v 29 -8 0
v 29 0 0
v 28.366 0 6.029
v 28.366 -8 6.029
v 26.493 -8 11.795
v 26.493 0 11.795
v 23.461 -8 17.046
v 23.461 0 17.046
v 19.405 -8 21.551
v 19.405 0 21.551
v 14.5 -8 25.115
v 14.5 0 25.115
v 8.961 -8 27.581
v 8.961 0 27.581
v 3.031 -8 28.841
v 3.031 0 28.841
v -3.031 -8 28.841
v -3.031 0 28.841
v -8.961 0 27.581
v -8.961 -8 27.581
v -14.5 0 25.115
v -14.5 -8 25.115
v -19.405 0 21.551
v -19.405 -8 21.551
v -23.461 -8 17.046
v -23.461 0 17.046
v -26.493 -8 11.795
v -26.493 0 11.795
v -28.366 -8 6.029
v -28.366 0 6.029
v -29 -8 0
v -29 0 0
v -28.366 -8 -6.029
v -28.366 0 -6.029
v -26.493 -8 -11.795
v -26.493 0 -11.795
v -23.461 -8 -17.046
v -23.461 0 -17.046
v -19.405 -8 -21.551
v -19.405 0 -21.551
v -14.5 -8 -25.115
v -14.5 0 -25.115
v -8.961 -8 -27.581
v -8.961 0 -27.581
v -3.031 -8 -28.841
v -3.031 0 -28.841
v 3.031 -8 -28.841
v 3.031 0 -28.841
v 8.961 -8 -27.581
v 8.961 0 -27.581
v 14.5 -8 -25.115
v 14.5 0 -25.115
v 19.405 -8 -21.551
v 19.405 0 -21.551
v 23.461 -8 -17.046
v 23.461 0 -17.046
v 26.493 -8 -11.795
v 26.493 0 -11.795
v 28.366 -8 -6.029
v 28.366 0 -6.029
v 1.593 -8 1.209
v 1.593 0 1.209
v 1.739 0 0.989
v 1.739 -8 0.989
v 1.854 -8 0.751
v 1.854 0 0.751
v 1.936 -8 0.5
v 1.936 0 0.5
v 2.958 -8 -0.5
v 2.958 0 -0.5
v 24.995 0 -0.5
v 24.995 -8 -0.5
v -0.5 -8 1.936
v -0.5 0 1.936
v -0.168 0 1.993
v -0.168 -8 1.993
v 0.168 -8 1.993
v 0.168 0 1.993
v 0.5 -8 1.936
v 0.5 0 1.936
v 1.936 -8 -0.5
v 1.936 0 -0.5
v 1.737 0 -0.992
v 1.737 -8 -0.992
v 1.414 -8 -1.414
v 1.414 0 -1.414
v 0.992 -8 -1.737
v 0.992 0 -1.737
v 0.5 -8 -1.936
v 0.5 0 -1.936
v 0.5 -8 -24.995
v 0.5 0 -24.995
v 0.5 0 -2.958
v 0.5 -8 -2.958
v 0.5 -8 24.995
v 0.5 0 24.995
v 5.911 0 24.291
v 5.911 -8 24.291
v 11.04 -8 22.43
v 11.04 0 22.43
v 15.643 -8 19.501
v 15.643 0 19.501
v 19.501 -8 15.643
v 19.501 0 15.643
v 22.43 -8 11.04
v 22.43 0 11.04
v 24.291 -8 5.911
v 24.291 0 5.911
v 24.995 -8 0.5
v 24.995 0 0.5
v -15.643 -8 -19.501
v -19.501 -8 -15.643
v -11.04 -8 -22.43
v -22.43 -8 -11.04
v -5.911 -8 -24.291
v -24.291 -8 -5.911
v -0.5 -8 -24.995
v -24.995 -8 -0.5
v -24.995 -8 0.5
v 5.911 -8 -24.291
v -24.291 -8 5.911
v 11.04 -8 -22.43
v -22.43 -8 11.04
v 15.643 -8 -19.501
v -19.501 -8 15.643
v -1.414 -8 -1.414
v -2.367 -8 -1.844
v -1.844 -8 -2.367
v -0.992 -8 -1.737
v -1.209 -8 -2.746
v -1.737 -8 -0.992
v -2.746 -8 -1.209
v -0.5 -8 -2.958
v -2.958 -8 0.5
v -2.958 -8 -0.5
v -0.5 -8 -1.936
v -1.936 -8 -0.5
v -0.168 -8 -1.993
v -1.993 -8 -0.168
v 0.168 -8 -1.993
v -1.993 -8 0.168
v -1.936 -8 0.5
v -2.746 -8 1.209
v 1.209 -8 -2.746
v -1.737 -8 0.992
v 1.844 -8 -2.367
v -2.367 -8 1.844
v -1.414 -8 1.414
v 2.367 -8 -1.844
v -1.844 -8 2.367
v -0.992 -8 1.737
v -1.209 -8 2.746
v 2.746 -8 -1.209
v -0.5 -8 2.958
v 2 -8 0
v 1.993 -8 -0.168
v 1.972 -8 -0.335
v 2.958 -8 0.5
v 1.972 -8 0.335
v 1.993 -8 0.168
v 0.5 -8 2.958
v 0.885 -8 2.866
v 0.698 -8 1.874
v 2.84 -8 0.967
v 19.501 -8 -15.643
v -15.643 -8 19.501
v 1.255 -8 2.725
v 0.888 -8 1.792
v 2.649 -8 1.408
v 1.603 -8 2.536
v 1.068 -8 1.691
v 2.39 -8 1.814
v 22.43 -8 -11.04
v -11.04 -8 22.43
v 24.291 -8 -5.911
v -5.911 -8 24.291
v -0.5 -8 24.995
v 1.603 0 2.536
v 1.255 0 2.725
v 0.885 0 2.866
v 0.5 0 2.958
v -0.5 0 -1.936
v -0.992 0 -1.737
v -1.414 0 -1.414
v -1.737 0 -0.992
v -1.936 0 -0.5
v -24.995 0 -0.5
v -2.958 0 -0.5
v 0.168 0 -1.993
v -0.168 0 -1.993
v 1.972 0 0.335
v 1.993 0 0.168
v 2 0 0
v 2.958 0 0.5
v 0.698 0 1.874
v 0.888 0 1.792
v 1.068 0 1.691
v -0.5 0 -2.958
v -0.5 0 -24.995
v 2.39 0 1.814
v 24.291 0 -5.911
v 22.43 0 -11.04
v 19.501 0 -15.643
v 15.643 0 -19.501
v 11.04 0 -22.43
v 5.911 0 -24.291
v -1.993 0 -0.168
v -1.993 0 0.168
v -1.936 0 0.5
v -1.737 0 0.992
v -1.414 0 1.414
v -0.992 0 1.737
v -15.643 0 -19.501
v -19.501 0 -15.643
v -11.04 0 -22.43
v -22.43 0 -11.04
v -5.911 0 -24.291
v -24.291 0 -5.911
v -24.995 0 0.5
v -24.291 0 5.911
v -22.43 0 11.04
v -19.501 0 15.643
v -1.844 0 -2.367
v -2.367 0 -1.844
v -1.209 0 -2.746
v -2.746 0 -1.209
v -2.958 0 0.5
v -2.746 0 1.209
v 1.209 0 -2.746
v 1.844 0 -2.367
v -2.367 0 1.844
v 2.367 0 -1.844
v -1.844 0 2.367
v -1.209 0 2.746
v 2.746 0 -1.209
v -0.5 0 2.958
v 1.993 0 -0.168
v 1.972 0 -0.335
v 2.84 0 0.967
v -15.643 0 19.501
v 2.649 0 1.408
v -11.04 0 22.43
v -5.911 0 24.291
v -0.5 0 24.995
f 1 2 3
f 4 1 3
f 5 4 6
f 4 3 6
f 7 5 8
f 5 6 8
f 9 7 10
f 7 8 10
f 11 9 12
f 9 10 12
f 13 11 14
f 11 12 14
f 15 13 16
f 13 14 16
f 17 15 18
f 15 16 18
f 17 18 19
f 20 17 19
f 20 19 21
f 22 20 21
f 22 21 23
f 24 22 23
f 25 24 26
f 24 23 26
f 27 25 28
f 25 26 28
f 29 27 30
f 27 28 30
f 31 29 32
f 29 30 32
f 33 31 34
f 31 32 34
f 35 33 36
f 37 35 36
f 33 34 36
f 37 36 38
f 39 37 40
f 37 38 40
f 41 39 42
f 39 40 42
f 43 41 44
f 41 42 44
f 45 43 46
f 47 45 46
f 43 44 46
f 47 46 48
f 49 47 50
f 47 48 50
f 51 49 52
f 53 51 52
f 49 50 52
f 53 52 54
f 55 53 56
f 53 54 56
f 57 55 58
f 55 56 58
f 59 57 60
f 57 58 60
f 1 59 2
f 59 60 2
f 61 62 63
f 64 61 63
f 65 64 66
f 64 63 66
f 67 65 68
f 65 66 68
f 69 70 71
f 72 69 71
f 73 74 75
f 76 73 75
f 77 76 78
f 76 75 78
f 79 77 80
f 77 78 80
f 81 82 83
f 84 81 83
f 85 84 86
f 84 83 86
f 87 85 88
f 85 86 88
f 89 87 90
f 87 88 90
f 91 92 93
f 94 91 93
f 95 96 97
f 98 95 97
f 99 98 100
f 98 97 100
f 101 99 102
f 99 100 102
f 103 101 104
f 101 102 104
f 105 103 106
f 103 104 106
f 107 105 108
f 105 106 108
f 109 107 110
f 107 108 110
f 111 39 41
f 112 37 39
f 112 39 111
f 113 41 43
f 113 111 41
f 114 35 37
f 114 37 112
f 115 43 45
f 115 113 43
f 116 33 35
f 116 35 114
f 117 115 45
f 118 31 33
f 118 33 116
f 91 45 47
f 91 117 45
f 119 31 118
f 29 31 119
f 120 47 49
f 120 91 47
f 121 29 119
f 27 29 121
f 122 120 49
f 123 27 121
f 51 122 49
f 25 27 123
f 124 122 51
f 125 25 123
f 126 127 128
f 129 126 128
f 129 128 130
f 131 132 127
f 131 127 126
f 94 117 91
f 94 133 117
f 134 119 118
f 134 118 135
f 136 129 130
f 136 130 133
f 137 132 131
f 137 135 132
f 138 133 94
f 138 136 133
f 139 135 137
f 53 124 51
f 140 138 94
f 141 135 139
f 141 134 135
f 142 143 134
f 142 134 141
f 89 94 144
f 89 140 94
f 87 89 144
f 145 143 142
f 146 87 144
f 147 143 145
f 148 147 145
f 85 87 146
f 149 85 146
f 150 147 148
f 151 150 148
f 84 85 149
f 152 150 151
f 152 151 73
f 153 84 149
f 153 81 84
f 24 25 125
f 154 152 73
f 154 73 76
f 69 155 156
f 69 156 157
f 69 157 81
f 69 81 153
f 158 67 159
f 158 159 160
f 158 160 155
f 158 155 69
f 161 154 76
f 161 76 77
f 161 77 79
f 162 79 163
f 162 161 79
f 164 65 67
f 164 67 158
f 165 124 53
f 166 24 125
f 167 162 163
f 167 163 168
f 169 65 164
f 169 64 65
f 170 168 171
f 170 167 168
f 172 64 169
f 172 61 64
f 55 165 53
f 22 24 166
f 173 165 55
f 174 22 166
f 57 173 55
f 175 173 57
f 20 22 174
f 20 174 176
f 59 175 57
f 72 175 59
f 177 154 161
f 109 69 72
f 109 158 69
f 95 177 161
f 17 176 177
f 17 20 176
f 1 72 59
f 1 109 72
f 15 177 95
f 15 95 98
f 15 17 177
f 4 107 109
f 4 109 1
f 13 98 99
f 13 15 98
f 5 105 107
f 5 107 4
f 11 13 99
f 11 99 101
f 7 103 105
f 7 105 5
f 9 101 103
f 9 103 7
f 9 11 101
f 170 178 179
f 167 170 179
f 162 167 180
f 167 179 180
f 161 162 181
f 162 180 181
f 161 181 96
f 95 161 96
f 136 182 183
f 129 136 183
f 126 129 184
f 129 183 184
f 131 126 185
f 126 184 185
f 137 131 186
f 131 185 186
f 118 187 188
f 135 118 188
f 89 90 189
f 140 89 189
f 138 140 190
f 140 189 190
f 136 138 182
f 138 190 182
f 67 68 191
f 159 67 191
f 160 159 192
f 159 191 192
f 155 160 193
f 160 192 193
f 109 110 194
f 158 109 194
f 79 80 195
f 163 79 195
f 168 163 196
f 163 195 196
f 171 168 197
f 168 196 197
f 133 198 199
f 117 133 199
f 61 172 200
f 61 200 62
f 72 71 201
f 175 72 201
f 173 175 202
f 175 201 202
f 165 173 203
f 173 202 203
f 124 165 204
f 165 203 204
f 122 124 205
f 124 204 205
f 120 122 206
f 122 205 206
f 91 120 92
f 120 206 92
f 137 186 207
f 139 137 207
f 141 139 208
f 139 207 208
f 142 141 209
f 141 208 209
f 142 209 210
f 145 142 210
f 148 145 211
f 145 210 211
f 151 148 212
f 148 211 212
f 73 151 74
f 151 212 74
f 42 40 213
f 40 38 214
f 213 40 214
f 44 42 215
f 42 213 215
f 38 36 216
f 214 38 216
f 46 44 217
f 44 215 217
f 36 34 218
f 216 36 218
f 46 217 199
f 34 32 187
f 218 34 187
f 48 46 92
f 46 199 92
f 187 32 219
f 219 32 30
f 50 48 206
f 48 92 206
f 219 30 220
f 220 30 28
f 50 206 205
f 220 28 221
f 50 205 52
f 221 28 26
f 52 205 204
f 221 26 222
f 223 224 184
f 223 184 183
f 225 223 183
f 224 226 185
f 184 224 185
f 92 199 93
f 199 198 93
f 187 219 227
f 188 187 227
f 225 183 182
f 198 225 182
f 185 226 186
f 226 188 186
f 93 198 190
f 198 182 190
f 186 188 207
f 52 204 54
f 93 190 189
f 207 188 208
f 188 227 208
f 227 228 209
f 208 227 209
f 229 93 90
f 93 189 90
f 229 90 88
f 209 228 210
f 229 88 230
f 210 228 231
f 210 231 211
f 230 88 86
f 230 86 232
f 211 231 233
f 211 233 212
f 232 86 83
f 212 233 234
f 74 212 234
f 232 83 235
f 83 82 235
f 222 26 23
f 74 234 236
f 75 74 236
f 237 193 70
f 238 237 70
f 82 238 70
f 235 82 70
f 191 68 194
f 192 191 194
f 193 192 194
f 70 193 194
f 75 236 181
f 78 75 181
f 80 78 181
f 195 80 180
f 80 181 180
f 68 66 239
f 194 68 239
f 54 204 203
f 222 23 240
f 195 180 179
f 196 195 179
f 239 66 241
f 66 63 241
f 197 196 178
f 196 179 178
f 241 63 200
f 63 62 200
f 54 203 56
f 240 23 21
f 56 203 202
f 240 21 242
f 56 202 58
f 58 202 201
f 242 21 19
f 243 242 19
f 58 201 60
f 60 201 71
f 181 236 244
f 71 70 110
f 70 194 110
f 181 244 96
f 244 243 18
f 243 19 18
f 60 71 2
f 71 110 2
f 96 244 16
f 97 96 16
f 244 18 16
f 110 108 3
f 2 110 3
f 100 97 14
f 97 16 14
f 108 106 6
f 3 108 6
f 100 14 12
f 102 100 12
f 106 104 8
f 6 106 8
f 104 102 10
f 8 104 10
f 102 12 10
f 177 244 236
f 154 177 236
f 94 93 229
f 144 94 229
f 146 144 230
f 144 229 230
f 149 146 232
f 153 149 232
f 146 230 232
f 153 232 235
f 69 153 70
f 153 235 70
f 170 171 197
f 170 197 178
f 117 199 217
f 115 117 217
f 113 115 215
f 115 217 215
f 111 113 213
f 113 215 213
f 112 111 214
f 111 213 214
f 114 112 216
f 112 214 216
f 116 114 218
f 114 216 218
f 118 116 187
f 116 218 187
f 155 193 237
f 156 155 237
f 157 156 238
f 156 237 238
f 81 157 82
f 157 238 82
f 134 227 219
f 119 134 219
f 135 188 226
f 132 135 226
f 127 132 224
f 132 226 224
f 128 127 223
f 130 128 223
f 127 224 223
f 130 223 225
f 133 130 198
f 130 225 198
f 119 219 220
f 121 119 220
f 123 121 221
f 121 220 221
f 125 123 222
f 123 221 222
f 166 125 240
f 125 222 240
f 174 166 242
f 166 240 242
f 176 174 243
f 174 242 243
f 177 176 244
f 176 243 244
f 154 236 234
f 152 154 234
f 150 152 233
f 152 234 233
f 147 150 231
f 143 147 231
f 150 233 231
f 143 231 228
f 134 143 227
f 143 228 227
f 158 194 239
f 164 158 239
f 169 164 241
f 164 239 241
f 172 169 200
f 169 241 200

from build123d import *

# Parameters (mm, degrees)
F0_R     = 29
F1_DEPTH = 8


with BuildPart() as f1:
    # F0 (on Front) → F1 (new body)
    with BuildSketch(Plane.XZ):
        Circle(F0_R)
        with BuildLine():
            ThreePointArc((0.5, 24.9949994999), (17.6776695297, 17.6776695297), (24.9949994999, 0.5))
            ThreePointArc((24.9949994999, 0.5), (24.9987498437, 0.2500125022), (25, 0))
            ThreePointArc((25, 0), (24.9987498437, -0.2500125022), (24.9949994999, -0.5))
            ThreePointArc((24.9949994999, -0.5), (17.6776695297, -17.6776695297), (0.5, -24.9949994999))
            ThreePointArc((0.5, -24.9949994999), (0, -25), (-0.5, -24.9949994999))
            ThreePointArc((-0.5, -24.9949994999), (-17.6776695297, -17.6776695297), (-24.9949994999, -0.5))
            ThreePointArc((-24.9949994999, -0.5), (-25, 0), (-24.9949994999, 0.5))
            ThreePointArc((-24.9949994999, 0.5), (-17.6776695297, 17.6776695297), (-0.5, 24.9949994999))
            ThreePointArc((-0.5, 24.9949994999), (0, 25), (0.5, 24.9949994999))
        make_face(mode=Mode.SUBTRACT)
        with BuildLine():
            ThreePointArc((1.9364916731, 0.5), (1.9840593925, 0.252008585), (2, 0))
            ThreePointArc((2, 0), (1.9840593925, -0.252008585), (1.9364916731, -0.5))
            Line((1.9364916731, -0.5), (2.9580398915, -0.5))
            ThreePointArc((2.9580398915, -0.5), (2.9894915684, -0.2508787808), (3, 0))
            ThreePointArc((3, 0), (2.9894915684, 0.2508787808), (2.9580398915, 0.5))
            Line((2.9580398915, 0.5), (1.9364916731, 0.5))
        make_face()
        with BuildLine():
            ThreePointArc((1.5931753199, 1.2090460702), (1.8000899569, 0.8715940265), (1.9364916731, 0.5))
            Line((1.9364916731, 0.5), (2.9580398915, 0.5))
            ThreePointArc((2.9580398915, 0.5), (2.7533824356, 1.1911696619), (2.3897629799, 1.8135691053))
            Line((2.3897629799, 1.8135691053), (1.5931753199, 1.2090460702))
        make_face()
        with BuildLine():
            Line((2.9580398915, -0.5), (1.9364916731, -0.5))
            ThreePointArc((1.9364916731, -0.5), (1.4142135624, -1.4142135624), (0.5, -1.9364916731))
            Line((0.5, -1.9364916731), (0.5, -2.9580398915))
            ThreePointArc((0.5, -2.9580398915), (2.1213203436, -2.1213203436), (2.9580398915, -0.5))
        make_face()
        with BuildLine():
            Line((24.9949994999, 0.5), (2.9580398915, 0.5))
            ThreePointArc((2.9580398915, 0.5), (2.9894915684, 0.2508787808), (3, 0))
            ThreePointArc((3, 0), (2.9894915684, -0.2508787808), (2.9580398915, -0.5))
            Line((2.9580398915, -0.5), (24.9949994999, -0.5))
            ThreePointArc((24.9949994999, -0.5), (24.9987498437, -0.2500125022), (25, 0))
            ThreePointArc((25, 0), (24.9987498437, 0.2500125022), (24.9949994999, 0.5))
        make_face()
        with BuildLine():
            Line((0.5, -2.9580398915), (0.5, -1.9364916731))
            ThreePointArc((0.5, -1.9364916731), (0, -2), (-0.5, -1.9364916731))
            Line((-0.5, -1.9364916731), (-0.5, -2.9580398915))
            ThreePointArc((-0.5, -2.9580398915), (0, -3), (0.5, -2.9580398915))
        make_face()
        with BuildLine():
            ThreePointArc((0.5, 1.9364916731), (0.7937447605, 1.8357476012), (1.068353257, 1.6907457876))
            Line((1.068353257, 1.6907457876), (1.6025298855, 2.5361186814))
            ThreePointArc((1.6025298855, 2.5361186814), (1.0722230909, 2.8018453996), (0.5, 2.9580398915))
            Line((0.5, 2.9580398915), (0.5, 1.9364916731))
        make_face()
        with BuildLine():
            Line((-0.5, -2.9580398915), (-0.5, -1.9364916731))
            ThreePointArc((-0.5, -1.9364916731), (-1.4142135624, -1.4142135624), (-1.9364916731, -0.5))
            Line((-1.9364916731, -0.5), (-2.9580398915, -0.5))
            ThreePointArc((-2.9580398915, -0.5), (-2.1213203436, -2.1213203436), (-0.5, -2.9580398915))
        make_face()
        with BuildLine():
            Line((0.5, -24.9949994999), (0.5, -2.9580398915))
            ThreePointArc((0.5, -2.9580398915), (0, -3), (-0.5, -2.9580398915))
            Line((-0.5, -2.9580398915), (-0.5, -24.9949994999))
            ThreePointArc((-0.5, -24.9949994999), (0, -25), (0.5, -24.9949994999))
        make_face()
        with BuildLine():
            ThreePointArc((-0.5, 1.9364916731), (0, 2), (0.5, 1.9364916731))
            Line((0.5, 1.9364916731), (0.5, 2.9580398915))
            ThreePointArc((0.5, 2.9580398915), (0, 3), (-0.5, 2.9580398915))
            Line((-0.5, 2.9580398915), (-0.5, 1.9364916731))
        make_face()
        with BuildLine():
            Line((0.5, 2.9580398915), (0.5, 24.9949994999))
            ThreePointArc((0.5, 24.9949994999), (0, 25), (-0.5, 24.9949994999))
            Line((-0.5, 24.9949994999), (-0.5, 2.9580398915))
            ThreePointArc((-0.5, 2.9580398915), (0, 3), (0.5, 2.9580398915))
        make_face()
        with BuildLine():
            Line((-2.9580398915, -0.5), (-1.9364916731, -0.5))
            ThreePointArc((-1.9364916731, -0.5), (-2, 0), (-1.9364916731, 0.5))
            Line((-1.9364916731, 0.5), (-2.9580398915, 0.5))
            ThreePointArc((-2.9580398915, 0.5), (-3, 0), (-2.9580398915, -0.5))
        make_face()
        with BuildLine():
            ThreePointArc((-1.9364916731, 0.5), (-1.4142135624, 1.4142135624), (-0.5, 1.9364916731))
            Line((-0.5, 1.9364916731), (-0.5, 2.9580398915))
            ThreePointArc((-0.5, 2.9580398915), (-2.1213203436, 2.1213203436), (-2.9580398915, 0.5))
            Line((-2.9580398915, 0.5), (-1.9364916731, 0.5))
        make_face()
        with BuildLine():
            Line((-24.9949994999, -0.5), (-2.9580398915, -0.5))
            ThreePointArc((-2.9580398915, -0.5), (-3, 0), (-2.9580398915, 0.5))
            Line((-2.9580398915, 0.5), (-24.9949994999, 0.5))
            ThreePointArc((-24.9949994999, 0.5), (-25, 0), (-24.9949994999, -0.5))
        make_face()
    extrude(amount=F1_DEPTH)


solid = f1.part
